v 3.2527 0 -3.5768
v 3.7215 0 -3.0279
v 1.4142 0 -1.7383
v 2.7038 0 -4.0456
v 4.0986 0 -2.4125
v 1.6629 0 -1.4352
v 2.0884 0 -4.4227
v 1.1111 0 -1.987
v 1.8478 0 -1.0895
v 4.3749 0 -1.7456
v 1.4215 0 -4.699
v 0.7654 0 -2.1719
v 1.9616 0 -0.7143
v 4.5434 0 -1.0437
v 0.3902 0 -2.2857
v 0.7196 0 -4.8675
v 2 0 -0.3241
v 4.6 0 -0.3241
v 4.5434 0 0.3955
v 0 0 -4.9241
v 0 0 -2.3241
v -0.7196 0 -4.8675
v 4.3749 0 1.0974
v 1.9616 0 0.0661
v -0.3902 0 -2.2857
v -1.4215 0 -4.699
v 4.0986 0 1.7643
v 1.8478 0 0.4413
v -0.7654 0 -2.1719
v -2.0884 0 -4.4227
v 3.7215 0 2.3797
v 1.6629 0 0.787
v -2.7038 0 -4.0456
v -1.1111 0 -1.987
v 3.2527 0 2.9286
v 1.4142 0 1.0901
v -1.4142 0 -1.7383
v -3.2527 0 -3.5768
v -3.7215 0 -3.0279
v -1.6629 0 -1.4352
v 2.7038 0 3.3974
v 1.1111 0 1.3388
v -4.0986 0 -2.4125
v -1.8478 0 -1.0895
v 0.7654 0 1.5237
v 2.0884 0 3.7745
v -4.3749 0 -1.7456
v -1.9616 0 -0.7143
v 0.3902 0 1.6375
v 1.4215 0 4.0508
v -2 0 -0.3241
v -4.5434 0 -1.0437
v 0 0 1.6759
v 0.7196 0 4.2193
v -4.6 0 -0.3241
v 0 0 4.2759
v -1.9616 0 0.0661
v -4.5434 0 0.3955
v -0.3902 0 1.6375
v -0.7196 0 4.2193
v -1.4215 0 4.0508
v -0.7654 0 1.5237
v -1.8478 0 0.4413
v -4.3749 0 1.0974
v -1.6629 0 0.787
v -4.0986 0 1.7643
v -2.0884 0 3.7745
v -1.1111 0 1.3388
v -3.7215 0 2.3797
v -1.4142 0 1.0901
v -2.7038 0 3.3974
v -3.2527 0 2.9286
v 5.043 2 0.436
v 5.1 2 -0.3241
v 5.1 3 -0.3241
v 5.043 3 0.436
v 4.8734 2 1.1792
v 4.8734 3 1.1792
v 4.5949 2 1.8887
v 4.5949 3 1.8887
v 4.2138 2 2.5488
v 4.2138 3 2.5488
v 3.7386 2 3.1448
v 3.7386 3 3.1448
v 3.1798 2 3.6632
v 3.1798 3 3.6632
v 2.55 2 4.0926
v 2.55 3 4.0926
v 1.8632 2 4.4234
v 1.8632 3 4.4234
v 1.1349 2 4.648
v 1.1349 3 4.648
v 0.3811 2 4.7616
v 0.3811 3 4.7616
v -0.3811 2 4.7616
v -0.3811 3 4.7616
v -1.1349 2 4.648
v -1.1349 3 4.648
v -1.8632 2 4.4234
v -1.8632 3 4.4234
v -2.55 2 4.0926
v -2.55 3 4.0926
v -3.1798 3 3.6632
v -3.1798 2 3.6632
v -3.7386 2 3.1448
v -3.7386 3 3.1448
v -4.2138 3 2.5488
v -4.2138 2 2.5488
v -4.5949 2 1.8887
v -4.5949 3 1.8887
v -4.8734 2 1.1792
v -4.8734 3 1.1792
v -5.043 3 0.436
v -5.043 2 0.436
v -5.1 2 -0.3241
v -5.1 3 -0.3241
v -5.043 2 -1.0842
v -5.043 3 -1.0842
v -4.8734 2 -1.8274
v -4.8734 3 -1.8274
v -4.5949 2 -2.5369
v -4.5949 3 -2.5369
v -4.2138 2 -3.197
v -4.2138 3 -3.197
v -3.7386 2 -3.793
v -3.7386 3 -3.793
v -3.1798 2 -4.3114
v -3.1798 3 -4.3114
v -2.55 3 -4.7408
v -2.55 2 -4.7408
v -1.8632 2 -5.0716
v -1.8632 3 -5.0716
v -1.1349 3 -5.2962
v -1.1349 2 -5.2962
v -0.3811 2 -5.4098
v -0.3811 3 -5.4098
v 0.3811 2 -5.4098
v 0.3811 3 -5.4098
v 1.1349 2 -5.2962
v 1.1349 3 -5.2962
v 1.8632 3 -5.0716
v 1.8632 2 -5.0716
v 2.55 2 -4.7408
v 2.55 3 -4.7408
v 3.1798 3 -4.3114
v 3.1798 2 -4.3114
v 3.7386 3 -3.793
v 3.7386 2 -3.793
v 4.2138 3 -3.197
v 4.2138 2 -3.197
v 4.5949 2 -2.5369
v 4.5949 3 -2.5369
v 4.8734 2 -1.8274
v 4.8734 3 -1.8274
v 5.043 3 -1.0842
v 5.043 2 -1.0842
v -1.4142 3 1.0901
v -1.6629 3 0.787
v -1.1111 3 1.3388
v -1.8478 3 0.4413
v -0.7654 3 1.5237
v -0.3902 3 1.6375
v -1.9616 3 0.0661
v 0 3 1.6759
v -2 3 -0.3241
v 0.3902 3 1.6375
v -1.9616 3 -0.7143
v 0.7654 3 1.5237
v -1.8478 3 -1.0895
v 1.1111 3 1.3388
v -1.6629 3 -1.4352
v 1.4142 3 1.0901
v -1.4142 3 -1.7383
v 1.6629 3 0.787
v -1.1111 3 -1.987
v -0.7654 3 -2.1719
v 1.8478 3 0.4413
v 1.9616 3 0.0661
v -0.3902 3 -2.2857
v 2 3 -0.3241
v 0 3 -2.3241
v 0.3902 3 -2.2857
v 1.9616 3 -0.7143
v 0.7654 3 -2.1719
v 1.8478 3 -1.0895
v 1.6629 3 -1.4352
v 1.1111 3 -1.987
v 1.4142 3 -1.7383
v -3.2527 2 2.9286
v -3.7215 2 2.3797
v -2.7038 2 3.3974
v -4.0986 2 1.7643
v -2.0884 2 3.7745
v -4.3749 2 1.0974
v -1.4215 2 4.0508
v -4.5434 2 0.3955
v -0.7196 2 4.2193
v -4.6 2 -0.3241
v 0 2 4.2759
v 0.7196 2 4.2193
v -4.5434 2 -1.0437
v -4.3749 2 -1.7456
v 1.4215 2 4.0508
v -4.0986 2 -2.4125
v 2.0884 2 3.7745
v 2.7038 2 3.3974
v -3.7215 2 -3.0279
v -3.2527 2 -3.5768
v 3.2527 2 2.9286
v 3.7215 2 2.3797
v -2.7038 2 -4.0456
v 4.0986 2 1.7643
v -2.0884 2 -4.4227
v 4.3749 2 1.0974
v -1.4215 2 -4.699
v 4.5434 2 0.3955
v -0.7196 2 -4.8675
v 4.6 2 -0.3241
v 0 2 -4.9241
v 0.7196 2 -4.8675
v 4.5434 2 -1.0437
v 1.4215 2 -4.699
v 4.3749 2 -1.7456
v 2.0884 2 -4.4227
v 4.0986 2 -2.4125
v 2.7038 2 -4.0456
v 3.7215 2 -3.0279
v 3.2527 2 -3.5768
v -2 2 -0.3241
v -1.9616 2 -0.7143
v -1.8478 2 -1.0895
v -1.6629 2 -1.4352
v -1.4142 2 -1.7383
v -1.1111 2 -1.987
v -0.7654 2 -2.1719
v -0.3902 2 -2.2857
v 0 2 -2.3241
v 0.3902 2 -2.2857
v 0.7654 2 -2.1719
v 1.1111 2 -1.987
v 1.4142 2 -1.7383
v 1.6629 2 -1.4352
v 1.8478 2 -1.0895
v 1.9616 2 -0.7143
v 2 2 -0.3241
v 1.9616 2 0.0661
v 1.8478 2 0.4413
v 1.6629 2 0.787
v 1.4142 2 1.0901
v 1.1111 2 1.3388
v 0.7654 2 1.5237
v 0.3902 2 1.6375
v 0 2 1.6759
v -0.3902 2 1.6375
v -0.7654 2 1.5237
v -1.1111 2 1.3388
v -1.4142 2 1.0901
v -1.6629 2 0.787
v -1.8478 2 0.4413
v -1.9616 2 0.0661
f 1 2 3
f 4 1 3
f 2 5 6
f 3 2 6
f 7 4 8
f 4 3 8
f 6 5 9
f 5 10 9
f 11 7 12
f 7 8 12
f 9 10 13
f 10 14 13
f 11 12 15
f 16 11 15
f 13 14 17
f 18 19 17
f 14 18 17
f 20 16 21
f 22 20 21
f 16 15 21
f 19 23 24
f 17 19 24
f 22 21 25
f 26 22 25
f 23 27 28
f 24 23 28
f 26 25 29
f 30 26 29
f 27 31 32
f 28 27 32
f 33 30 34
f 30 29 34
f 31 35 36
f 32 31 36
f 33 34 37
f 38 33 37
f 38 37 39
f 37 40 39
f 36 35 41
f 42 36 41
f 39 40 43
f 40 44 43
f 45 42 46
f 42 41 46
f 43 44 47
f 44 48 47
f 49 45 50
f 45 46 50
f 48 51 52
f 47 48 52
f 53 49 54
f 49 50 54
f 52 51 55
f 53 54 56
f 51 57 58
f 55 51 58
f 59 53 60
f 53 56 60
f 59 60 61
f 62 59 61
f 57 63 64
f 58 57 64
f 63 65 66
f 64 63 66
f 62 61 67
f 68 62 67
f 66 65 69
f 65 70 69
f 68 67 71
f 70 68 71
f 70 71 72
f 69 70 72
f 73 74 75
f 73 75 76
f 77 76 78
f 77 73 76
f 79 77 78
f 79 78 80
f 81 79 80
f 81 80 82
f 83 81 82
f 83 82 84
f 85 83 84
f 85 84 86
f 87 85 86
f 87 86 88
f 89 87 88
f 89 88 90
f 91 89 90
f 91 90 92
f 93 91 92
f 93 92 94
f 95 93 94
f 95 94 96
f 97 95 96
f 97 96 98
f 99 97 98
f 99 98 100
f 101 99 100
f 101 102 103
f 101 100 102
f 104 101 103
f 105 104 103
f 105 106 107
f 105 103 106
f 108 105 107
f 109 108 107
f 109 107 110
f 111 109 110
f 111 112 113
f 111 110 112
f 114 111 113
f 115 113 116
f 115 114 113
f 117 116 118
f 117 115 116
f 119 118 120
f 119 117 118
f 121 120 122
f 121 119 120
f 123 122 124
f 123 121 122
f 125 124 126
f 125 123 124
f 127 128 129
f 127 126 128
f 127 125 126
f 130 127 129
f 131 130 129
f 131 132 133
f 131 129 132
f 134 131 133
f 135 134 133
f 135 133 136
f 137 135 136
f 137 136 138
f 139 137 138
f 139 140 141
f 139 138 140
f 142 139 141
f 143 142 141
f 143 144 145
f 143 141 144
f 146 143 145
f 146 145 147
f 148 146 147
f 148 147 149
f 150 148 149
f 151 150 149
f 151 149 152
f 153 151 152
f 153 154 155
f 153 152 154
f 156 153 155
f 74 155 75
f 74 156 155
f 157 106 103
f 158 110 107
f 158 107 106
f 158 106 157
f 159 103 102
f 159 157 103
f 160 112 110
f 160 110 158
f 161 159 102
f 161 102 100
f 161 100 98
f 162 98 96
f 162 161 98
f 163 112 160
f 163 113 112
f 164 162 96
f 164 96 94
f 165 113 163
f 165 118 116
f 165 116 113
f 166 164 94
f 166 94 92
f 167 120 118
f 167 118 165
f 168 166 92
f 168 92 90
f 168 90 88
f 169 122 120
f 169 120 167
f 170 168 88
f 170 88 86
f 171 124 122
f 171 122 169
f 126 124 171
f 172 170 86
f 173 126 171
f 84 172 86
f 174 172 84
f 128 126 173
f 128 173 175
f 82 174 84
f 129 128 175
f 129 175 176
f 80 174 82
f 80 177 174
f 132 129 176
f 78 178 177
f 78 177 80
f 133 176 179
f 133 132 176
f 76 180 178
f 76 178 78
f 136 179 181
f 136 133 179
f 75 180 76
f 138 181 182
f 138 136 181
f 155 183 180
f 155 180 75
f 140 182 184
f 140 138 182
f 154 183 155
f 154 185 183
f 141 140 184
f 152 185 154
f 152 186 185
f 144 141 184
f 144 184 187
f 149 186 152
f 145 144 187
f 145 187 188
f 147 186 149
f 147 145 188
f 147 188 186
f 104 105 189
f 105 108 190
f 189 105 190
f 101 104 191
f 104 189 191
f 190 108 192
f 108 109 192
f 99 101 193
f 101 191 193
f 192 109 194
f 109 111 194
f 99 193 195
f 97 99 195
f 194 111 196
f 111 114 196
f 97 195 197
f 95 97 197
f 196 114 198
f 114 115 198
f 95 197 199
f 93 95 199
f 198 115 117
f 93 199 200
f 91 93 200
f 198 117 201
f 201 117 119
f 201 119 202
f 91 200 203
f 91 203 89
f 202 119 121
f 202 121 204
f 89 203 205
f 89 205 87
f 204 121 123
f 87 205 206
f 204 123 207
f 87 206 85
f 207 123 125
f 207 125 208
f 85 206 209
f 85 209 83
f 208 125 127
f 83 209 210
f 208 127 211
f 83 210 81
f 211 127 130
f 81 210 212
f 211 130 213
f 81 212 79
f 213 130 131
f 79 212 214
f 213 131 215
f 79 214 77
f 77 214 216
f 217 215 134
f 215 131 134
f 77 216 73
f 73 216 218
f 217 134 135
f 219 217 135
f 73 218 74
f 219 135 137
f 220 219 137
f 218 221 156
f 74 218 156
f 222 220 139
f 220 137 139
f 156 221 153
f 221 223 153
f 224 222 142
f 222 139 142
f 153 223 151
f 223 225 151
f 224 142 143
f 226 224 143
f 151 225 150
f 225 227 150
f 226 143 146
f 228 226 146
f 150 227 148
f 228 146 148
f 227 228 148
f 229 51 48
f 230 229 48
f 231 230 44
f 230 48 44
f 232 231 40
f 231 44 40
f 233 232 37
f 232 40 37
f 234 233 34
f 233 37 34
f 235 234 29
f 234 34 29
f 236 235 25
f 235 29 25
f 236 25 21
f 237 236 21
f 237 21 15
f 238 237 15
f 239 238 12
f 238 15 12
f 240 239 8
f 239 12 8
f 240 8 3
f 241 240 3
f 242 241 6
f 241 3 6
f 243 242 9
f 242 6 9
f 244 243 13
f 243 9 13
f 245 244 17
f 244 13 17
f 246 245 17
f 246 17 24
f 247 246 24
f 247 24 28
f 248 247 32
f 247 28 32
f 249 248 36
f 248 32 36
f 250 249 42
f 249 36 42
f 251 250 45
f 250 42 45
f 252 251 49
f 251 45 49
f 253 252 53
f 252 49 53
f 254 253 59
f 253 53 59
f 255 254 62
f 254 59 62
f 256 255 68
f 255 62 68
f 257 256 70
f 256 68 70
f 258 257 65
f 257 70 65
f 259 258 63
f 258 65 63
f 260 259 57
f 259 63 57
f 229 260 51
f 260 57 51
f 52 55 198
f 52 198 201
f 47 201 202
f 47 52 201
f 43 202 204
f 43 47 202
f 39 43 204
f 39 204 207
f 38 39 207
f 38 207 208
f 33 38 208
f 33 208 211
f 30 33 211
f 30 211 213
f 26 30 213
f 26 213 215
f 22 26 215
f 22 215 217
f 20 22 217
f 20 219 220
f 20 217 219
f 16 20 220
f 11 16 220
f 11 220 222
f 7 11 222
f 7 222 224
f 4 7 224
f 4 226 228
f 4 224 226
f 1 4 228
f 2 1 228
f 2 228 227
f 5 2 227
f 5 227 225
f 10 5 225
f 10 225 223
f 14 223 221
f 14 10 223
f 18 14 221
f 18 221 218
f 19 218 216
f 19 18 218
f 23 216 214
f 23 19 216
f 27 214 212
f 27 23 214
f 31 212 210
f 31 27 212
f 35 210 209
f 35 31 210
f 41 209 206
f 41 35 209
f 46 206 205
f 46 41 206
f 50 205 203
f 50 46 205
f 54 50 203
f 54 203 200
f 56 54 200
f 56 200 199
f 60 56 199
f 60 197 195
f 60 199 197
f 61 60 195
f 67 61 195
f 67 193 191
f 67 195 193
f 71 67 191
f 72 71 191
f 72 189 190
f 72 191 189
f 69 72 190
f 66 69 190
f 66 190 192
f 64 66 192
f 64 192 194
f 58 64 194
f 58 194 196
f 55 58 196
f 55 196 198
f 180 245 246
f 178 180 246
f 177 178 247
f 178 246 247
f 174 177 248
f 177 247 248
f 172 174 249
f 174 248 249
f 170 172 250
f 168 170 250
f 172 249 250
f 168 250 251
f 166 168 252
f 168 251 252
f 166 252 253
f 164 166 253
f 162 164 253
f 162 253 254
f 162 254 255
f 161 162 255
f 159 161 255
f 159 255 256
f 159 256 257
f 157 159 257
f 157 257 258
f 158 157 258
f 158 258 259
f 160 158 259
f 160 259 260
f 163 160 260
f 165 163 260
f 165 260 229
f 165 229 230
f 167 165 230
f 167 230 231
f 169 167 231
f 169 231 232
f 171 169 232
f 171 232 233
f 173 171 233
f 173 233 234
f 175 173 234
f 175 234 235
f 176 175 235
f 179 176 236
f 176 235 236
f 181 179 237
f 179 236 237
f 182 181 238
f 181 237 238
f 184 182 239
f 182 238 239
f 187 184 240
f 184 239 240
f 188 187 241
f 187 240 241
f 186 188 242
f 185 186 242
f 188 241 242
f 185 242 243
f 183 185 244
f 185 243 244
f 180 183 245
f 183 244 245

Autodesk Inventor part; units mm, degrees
ref_plane "YZ Plane" through (0, 0, 0) normal (1, 0, 0) x (0, 1, 0)
ref_plane "XZ Plane" through (0, 0, 0) normal (0, 1, 0) x (-1, 0, 0)
ref_plane "XY Plane" through (0, 0, 0) normal (0, 0, 1) x (1, 0, 0)
sketch "Эскиз1" plane through (0, 0, 0) normal (0, 1, 0) x (-1, 0, 0)
  circle A0 centre (0, -0.3241) radius 4.6
  circle A1 centre (0, -0.3241) radius 2
  point P0 (0, 0)
  dimension "d0" = 9.2
  dimension "d1" = 4
extrude "Выдавливание1" add sketch "Эскиз1" along normal blind 2
sketch "Эскиз2" plane through (0, 2, -0.3241) normal (0, 1, 0) x (1, 0, 0)
  circle A0 centre (0, 0) radius 5.1
  point P0 (0, -0.3241)
  dimension "d4" = 10.2
extrude "Выдавливание2" add sketch "Эскиз2" along normal blind 1
sketch "Эскиз3" plane through (0, 2, -0.3241) normal (0, -1, 0) x (1, 0, 0)
  circle A0 centre (0, 0) radius 2
  point P0 (0, 0.3241)
  dimension "d7" = 4
extrude "Выдавливание3" cut sketch "Эскиз3" against normal blind 1
properties part number "bearing"
